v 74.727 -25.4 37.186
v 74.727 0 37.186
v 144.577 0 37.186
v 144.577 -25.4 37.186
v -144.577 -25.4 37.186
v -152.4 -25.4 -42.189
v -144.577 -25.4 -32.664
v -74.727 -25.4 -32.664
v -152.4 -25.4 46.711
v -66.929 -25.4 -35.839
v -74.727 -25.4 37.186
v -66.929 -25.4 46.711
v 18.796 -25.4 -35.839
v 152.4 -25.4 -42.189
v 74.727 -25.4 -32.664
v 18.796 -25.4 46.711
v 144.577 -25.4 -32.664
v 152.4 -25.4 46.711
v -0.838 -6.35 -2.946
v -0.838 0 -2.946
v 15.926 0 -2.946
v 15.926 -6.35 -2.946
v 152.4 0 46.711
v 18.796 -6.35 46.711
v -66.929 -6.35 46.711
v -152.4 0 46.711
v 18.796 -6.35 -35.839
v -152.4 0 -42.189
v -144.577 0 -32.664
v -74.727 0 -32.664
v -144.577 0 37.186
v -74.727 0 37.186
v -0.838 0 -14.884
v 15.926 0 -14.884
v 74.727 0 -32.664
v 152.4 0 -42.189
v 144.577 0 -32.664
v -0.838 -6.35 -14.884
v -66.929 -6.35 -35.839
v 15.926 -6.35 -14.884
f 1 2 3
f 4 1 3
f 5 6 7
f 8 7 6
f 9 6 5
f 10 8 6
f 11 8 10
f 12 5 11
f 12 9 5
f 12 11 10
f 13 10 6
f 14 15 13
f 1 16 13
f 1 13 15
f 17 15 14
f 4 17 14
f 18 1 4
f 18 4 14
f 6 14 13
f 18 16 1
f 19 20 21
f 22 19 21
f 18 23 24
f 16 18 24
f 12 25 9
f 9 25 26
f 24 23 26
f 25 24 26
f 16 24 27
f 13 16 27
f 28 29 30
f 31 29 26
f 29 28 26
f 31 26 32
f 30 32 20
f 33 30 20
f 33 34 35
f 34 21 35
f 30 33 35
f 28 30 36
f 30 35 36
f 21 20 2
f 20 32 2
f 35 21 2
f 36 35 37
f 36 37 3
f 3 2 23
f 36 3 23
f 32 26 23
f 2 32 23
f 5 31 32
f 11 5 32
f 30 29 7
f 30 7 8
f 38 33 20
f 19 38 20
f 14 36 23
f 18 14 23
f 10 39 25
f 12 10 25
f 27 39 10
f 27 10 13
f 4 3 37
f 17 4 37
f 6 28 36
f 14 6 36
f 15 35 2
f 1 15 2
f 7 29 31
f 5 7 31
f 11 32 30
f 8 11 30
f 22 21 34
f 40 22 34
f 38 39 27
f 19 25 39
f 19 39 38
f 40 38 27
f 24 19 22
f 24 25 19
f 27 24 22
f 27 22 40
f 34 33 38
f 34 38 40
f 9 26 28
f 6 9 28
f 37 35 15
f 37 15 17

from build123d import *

# Parameters (mm, degrees)
F0_W     = 7.8232
F0_H     = 6.35
F0_W_2   = 69.85
F0_H_2   = 3.175
F0_W_3   = 55.9308
F0_H_3   = 69.85
F0_W_4   = 7.7978
F0_H_4   = 12.7
F0_W_5   = 85.725
F1_DEPTH = 25.4
F0_W_6   = 2.8702
F0_H_5   = 5.1918955931
F0_W_7   = 66.0908
F0_H_6   = 4.9097025247
F0_H_7   = 13.4315382606
F0_W_8   = 16.764
F0_H_8   = 0.762
F2_DEPTH = 6.35


with BuildPart() as f1:
    # F0 (on Front) → F1 (new body)
    with BuildSketch(Plane.XZ):
        with Locations((148.4884, 43.5362195122)):
            Rectangle(F0_W, F0_H)
        with Locations((109.6518, 43.5362195122)):
            Rectangle(F0_W_2, F0_H)
        with Locations((148.4884, 38.7737195122)):
            Rectangle(F0_W, F0_H_2)
        with Locations((46.7614, 43.5362195122)):
            Rectangle(F0_W_3, F0_H)
        with Locations((109.6518, 38.7737195122)):
            Rectangle(F0_W_2, F0_H_2)
        with Locations((148.4884, 2.2612195122)):
            Rectangle(F0_W, F0_H_3)
        with Locations((46.7614, 38.7737195122)):
            Rectangle(F0_W_3, F0_H_2)
        with Locations((148.4884, -34.2512804878)):
            Rectangle(F0_W, F0_H_2)
        with Locations((-70.8279, 43.5362195122)):
            Rectangle(F0_W_4, F0_H)
        Polygon((74.7268, -2.1837804878), (74.7268, 37.1862195122), (18.796, 37.1862195122), (18.796, 3.0081151053), (18.796, -2.1837804878), align=None)
        with Locations((109.6518, -34.2512804878)):
            Rectangle(F0_W_2, F0_H_2)
        with Locations((148.4884, -39.0137804878)):
            Rectangle(F0_W, F0_H)
        with Locations((-109.6518, 43.5362195122)):
            Rectangle(F0_W_2, F0_H)
        with Locations((-70.8279, 38.7737195122)):
            Rectangle(F0_W_4, F0_H_2)
        with Locations((46.7614, -8.5337804878)):
            Rectangle(F0_W_3, F0_H_4)
        with Locations((109.6518, -39.0137804878)):
            Rectangle(F0_W_2, F0_H)
        Polygon((18.796, -32.6637804878), (74.7268, -32.6637804878), (74.7268, -14.8837804878), (18.796, -14.8837804878), (18.796, -28.3153187484), align=None)
        with Locations((46.7614, -34.2512804878)):
            Rectangle(F0_W_3, F0_H_2)
        with Locations((-148.4884, 43.5362195122)):
            Rectangle(F0_W, F0_H)
        with Locations((-109.6518, 38.7737195122)):
            Rectangle(F0_W_2, F0_H_2)
        Polygon((-66.929, 2.7259220369), (-66.929, 37.1862195122), (-74.7268, 37.1862195122), (-74.7268, -2.1837804878), (-66.929, -2.1837804878), align=None)
        with Locations((46.7614, -39.0137804878)):
            Rectangle(F0_W_3, F0_H)
        with Locations((-148.4884, 38.7737195122)):
            Rectangle(F0_W, F0_H_2)
        with Locations((-24.0665, -39.0137804878)):
            Rectangle(F0_W_5, F0_H)
        Polygon((-74.7268, -32.6637804878), (-66.929, -32.6637804878), (-66.929, -28.3153187484), (-66.929, -14.8837804878), (-74.7268, -14.8837804878), align=None)
        with Locations((-70.8279, -34.2512804878)):
            Rectangle(F0_W_4, F0_H_2)
        with Locations((-148.4884, 2.2612195122)):
            Rectangle(F0_W, F0_H_3)
        with Locations((-70.8279, -8.5337804878)):
            Rectangle(F0_W_4, F0_H_4)
        with Locations((-70.8279, -39.0137804878)):
            Rectangle(F0_W_4, F0_H)
        with Locations((-109.6518, -34.2512804878)):
            Rectangle(F0_W_2, F0_H_2)
        with Locations((-148.4884, -34.2512804878)):
            Rectangle(F0_W, F0_H_2)
        with Locations((-109.6518, -39.0137804878)):
            Rectangle(F0_W_2, F0_H)
        with Locations((-148.4884, -39.0137804878)):
            Rectangle(F0_W, F0_H)
    extrude(amount=F1_DEPTH)

    # F0 (on Front) → F2 (join)
    with BuildSketch(Plane.XZ):
        with Locations((-24.0665, 43.5362195122)):
            Rectangle(F0_W_5, F0_H)
        with Locations((-70.8279, 43.5362195122)):
            Rectangle(F0_W_4, F0_H)
        with Locations((-24.0665, 38.7737195122)):
            Rectangle(F0_W_5, F0_H_2)
        with Locations((-70.8279, 38.7737195122)):
            Rectangle(F0_W_4, F0_H_2)
        Polygon((18.796, 3.0081151053), (18.796, 37.1862195122), (-66.929, 37.1862195122), (-66.929, 2.7259220369), (-0.8382, 2.7259220369), (-0.8382, 3.0081151053), (15.9258, 3.0081151053), align=None)
        with Locations((17.3609, 0.4121673088)):
            Rectangle(F0_W_6, F0_H_5)
        Polygon((18.796, -14.8837804878), (18.796, -2.1837804878), (15.9258, -2.1837804878), (15.9258, -2.9457804878), (15.9258, -14.8837804878), align=None)
        Polygon((-66.929, -32.6637804878), (18.796, -32.6637804878), (18.796, -28.3153187484), (15.9258, -28.3153187484), (-0.8382, -28.3153187484), (-66.929, -28.3153187484), align=None)
        with Locations((-24.0665, -34.2512804878)):
            Rectangle(F0_W_5, F0_H_2)
        with Locations((-33.8836, 0.2710707746)):
            Rectangle(F0_W_7, F0_H_6)
        Polygon((15.9258, -2.1837804878), (15.9258, 3.0081151053), (-0.8382, 3.0081151053), (-0.8382, 2.7259220369), (-0.8382, -2.1837804878), align=None)
        with Locations((17.3609, -21.5995496181)):
            Rectangle(F0_W_6, F0_H_7)
        with Locations((7.5438, -2.5647804878)):
            Rectangle(F0_W_8, F0_H_8)
        Polygon((-0.8382, -2.1837804878), (-66.929, -2.1837804878), (-66.929, -14.8837804878), (-0.8382, -14.8837804878), (-0.8382, -2.9457804878), align=None)
        with Locations((7.5438, -21.5995496181)):
            Rectangle(F0_W_8, F0_H_7)
        with Locations((-33.8836, -21.5995496181)):
            Rectangle(F0_W_7, F0_H_7)
    extrude(amount=F2_DEPTH)


solid = f1.part
